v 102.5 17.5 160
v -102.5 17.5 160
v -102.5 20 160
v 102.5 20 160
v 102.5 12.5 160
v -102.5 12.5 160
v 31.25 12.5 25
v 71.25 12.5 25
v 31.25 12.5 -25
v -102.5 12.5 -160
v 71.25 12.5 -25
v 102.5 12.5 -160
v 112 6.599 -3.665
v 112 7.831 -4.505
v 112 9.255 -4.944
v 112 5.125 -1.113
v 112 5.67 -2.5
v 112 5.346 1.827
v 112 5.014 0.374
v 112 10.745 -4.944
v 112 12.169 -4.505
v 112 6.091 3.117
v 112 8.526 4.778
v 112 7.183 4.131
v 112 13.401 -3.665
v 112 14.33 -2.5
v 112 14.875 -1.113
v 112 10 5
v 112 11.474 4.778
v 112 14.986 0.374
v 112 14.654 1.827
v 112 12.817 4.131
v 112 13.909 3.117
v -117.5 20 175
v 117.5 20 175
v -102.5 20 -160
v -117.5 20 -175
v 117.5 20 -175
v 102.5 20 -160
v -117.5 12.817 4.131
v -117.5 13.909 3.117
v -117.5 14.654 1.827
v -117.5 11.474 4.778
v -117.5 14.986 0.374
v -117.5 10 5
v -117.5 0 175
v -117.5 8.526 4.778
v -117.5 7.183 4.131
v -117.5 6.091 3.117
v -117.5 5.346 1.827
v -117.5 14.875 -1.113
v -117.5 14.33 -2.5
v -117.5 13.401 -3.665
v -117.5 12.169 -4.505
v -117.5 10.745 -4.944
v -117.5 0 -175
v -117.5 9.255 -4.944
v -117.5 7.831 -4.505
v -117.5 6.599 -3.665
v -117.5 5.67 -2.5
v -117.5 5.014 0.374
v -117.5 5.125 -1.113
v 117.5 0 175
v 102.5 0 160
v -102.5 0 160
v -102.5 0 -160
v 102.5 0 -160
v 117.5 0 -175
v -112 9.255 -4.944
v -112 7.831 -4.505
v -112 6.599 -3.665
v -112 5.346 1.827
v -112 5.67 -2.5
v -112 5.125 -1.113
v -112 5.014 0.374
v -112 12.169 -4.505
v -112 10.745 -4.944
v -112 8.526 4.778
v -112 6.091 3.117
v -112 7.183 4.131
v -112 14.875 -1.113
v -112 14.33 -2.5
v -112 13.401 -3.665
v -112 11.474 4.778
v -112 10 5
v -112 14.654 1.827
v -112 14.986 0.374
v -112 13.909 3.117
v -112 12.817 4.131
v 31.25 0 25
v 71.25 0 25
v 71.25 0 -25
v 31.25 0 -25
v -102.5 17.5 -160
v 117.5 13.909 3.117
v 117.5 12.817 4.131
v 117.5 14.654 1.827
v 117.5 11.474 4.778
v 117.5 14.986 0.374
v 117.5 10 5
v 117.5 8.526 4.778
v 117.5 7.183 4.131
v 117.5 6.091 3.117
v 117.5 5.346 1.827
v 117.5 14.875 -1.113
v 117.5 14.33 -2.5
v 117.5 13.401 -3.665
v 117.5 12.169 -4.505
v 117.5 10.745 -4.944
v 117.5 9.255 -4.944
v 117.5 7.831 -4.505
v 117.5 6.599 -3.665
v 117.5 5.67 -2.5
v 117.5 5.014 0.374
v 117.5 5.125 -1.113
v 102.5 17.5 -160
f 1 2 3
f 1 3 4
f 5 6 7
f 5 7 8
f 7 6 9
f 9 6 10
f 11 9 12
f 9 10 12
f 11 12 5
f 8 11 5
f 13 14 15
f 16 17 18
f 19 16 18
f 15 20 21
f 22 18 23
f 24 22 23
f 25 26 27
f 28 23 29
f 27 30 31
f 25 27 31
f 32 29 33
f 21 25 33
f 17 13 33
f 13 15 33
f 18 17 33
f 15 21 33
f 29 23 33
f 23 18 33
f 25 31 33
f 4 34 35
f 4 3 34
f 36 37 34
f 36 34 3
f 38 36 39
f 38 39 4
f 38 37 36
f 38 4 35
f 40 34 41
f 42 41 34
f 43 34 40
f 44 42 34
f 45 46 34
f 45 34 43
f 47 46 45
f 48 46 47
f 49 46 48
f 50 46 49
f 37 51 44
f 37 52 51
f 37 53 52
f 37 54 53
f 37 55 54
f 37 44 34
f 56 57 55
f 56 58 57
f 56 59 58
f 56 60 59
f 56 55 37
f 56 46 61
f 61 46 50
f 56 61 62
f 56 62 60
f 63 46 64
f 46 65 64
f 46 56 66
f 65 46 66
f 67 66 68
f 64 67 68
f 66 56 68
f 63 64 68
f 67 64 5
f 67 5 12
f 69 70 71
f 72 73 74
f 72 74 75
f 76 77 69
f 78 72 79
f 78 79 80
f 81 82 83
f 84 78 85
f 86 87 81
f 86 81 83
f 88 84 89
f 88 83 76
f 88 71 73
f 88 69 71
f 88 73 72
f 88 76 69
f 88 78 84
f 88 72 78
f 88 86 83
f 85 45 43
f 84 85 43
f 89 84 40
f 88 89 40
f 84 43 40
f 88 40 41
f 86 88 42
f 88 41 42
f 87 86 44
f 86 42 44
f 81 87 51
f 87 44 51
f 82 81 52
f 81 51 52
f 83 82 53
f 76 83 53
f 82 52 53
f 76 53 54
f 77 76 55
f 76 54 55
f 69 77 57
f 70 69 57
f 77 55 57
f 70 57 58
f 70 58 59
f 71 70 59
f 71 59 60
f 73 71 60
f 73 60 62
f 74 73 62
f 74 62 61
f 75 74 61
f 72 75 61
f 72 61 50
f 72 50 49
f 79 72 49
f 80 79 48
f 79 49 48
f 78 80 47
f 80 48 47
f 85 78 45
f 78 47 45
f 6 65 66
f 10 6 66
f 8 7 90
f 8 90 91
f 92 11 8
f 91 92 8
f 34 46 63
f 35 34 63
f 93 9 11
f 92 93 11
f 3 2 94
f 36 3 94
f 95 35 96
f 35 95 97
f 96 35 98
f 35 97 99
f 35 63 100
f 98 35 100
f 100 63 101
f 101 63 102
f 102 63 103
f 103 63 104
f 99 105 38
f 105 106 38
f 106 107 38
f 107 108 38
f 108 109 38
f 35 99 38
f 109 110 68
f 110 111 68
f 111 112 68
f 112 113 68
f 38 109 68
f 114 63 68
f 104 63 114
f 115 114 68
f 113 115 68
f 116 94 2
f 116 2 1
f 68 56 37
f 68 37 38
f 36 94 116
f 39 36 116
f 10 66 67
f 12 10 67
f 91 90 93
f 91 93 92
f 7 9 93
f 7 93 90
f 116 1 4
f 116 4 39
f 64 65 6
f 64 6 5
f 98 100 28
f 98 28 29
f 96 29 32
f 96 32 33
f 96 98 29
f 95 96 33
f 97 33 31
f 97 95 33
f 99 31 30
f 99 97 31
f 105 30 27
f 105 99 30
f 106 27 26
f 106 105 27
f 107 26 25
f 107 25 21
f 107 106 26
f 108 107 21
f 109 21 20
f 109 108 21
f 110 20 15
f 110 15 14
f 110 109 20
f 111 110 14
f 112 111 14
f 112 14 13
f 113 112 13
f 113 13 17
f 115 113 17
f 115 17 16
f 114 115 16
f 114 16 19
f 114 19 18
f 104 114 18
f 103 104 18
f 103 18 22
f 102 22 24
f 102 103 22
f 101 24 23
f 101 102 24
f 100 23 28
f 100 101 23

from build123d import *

# Parameters (mm, degrees)
SKETCH1_W                = 235
SKETCH1_H                = 350
SKETCH1_W_2              = 205
SKETCH1_H_2              = 320
BOSS_EXTRUDE1_DEPTH      = 20
BOSS_EXTRUDE2_START      = 15
SKETCH1_2_W              = 205
SKETCH1_2_H              = 320
BOSS_EXTRUDE2_DEPTH      = 2.5
BOSS_EXTRUDE2_DEPTH_BACK = 2.5
SKETCH2_W                = 40
SKETCH2_H                = 50
BOSS_EXTRUDE3_DEPTH      = 12.5
SKETCH3_R                = 5
CUT_EXTRUDE1_DEPTH       = 5.5
CUT_EXTRUDE2_START       = -235
SKETCH3_3_R              = 5
CUT_EXTRUDE2_DEPTH       = 5.5


with BuildPart() as part:
    # Sketch1 → Boss-Extrude1 (new body)
    with BuildSketch(Plane(origin=(0, 0, 0), x_dir=(1, 0, 0), z_dir=(0, 1, 0))):
        Rectangle(SKETCH1_W, SKETCH1_H)
        Rectangle(SKETCH1_W_2, SKETCH1_H_2, mode=Mode.SUBTRACT)
    extrude(amount=BOSS_EXTRUDE1_DEPTH)

    # Sketch1<2> → Boss-Extrude2 (add, two sides)
    with BuildSketch(Plane(origin=(0, 0, 0), x_dir=(1, 0, 0), z_dir=(0, 1, 0)).offset(BOSS_EXTRUDE2_START)) as boss_extrude2_sk:
        Rectangle(SKETCH1_2_W, SKETCH1_2_H)
    extrude(amount=BOSS_EXTRUDE2_DEPTH)
    extrude(boss_extrude2_sk.sketch, amount=-BOSS_EXTRUDE2_DEPTH_BACK)

    # Sketch2 → Boss-Extrude3 (add)
    with BuildSketch(Plane.XZ.offset(-12.5)):
        with Locations((51.25, 0)):
            Rectangle(SKETCH2_W, SKETCH2_H)
    extrude(amount=BOSS_EXTRUDE3_DEPTH)

    # Sketch3 → Cut-Extrude1 (cut)
    with BuildSketch(Plane.ZY.offset(117.5)):
        with Locations((0, 10)):
            Circle(SKETCH3_R)
    extrude(amount=-CUT_EXTRUDE1_DEPTH, mode=Mode.SUBTRACT)

    # Sketch3<3> → Cut-Extrude2 (cut)
    with BuildSketch(Plane.ZY.offset(117.5).offset(CUT_EXTRUDE2_START)):
        with Locations((0, 10)):
            Circle(SKETCH3_3_R)
    extrude(amount=CUT_EXTRUDE2_DEPTH, mode=Mode.SUBTRACT)


solid = part.part
